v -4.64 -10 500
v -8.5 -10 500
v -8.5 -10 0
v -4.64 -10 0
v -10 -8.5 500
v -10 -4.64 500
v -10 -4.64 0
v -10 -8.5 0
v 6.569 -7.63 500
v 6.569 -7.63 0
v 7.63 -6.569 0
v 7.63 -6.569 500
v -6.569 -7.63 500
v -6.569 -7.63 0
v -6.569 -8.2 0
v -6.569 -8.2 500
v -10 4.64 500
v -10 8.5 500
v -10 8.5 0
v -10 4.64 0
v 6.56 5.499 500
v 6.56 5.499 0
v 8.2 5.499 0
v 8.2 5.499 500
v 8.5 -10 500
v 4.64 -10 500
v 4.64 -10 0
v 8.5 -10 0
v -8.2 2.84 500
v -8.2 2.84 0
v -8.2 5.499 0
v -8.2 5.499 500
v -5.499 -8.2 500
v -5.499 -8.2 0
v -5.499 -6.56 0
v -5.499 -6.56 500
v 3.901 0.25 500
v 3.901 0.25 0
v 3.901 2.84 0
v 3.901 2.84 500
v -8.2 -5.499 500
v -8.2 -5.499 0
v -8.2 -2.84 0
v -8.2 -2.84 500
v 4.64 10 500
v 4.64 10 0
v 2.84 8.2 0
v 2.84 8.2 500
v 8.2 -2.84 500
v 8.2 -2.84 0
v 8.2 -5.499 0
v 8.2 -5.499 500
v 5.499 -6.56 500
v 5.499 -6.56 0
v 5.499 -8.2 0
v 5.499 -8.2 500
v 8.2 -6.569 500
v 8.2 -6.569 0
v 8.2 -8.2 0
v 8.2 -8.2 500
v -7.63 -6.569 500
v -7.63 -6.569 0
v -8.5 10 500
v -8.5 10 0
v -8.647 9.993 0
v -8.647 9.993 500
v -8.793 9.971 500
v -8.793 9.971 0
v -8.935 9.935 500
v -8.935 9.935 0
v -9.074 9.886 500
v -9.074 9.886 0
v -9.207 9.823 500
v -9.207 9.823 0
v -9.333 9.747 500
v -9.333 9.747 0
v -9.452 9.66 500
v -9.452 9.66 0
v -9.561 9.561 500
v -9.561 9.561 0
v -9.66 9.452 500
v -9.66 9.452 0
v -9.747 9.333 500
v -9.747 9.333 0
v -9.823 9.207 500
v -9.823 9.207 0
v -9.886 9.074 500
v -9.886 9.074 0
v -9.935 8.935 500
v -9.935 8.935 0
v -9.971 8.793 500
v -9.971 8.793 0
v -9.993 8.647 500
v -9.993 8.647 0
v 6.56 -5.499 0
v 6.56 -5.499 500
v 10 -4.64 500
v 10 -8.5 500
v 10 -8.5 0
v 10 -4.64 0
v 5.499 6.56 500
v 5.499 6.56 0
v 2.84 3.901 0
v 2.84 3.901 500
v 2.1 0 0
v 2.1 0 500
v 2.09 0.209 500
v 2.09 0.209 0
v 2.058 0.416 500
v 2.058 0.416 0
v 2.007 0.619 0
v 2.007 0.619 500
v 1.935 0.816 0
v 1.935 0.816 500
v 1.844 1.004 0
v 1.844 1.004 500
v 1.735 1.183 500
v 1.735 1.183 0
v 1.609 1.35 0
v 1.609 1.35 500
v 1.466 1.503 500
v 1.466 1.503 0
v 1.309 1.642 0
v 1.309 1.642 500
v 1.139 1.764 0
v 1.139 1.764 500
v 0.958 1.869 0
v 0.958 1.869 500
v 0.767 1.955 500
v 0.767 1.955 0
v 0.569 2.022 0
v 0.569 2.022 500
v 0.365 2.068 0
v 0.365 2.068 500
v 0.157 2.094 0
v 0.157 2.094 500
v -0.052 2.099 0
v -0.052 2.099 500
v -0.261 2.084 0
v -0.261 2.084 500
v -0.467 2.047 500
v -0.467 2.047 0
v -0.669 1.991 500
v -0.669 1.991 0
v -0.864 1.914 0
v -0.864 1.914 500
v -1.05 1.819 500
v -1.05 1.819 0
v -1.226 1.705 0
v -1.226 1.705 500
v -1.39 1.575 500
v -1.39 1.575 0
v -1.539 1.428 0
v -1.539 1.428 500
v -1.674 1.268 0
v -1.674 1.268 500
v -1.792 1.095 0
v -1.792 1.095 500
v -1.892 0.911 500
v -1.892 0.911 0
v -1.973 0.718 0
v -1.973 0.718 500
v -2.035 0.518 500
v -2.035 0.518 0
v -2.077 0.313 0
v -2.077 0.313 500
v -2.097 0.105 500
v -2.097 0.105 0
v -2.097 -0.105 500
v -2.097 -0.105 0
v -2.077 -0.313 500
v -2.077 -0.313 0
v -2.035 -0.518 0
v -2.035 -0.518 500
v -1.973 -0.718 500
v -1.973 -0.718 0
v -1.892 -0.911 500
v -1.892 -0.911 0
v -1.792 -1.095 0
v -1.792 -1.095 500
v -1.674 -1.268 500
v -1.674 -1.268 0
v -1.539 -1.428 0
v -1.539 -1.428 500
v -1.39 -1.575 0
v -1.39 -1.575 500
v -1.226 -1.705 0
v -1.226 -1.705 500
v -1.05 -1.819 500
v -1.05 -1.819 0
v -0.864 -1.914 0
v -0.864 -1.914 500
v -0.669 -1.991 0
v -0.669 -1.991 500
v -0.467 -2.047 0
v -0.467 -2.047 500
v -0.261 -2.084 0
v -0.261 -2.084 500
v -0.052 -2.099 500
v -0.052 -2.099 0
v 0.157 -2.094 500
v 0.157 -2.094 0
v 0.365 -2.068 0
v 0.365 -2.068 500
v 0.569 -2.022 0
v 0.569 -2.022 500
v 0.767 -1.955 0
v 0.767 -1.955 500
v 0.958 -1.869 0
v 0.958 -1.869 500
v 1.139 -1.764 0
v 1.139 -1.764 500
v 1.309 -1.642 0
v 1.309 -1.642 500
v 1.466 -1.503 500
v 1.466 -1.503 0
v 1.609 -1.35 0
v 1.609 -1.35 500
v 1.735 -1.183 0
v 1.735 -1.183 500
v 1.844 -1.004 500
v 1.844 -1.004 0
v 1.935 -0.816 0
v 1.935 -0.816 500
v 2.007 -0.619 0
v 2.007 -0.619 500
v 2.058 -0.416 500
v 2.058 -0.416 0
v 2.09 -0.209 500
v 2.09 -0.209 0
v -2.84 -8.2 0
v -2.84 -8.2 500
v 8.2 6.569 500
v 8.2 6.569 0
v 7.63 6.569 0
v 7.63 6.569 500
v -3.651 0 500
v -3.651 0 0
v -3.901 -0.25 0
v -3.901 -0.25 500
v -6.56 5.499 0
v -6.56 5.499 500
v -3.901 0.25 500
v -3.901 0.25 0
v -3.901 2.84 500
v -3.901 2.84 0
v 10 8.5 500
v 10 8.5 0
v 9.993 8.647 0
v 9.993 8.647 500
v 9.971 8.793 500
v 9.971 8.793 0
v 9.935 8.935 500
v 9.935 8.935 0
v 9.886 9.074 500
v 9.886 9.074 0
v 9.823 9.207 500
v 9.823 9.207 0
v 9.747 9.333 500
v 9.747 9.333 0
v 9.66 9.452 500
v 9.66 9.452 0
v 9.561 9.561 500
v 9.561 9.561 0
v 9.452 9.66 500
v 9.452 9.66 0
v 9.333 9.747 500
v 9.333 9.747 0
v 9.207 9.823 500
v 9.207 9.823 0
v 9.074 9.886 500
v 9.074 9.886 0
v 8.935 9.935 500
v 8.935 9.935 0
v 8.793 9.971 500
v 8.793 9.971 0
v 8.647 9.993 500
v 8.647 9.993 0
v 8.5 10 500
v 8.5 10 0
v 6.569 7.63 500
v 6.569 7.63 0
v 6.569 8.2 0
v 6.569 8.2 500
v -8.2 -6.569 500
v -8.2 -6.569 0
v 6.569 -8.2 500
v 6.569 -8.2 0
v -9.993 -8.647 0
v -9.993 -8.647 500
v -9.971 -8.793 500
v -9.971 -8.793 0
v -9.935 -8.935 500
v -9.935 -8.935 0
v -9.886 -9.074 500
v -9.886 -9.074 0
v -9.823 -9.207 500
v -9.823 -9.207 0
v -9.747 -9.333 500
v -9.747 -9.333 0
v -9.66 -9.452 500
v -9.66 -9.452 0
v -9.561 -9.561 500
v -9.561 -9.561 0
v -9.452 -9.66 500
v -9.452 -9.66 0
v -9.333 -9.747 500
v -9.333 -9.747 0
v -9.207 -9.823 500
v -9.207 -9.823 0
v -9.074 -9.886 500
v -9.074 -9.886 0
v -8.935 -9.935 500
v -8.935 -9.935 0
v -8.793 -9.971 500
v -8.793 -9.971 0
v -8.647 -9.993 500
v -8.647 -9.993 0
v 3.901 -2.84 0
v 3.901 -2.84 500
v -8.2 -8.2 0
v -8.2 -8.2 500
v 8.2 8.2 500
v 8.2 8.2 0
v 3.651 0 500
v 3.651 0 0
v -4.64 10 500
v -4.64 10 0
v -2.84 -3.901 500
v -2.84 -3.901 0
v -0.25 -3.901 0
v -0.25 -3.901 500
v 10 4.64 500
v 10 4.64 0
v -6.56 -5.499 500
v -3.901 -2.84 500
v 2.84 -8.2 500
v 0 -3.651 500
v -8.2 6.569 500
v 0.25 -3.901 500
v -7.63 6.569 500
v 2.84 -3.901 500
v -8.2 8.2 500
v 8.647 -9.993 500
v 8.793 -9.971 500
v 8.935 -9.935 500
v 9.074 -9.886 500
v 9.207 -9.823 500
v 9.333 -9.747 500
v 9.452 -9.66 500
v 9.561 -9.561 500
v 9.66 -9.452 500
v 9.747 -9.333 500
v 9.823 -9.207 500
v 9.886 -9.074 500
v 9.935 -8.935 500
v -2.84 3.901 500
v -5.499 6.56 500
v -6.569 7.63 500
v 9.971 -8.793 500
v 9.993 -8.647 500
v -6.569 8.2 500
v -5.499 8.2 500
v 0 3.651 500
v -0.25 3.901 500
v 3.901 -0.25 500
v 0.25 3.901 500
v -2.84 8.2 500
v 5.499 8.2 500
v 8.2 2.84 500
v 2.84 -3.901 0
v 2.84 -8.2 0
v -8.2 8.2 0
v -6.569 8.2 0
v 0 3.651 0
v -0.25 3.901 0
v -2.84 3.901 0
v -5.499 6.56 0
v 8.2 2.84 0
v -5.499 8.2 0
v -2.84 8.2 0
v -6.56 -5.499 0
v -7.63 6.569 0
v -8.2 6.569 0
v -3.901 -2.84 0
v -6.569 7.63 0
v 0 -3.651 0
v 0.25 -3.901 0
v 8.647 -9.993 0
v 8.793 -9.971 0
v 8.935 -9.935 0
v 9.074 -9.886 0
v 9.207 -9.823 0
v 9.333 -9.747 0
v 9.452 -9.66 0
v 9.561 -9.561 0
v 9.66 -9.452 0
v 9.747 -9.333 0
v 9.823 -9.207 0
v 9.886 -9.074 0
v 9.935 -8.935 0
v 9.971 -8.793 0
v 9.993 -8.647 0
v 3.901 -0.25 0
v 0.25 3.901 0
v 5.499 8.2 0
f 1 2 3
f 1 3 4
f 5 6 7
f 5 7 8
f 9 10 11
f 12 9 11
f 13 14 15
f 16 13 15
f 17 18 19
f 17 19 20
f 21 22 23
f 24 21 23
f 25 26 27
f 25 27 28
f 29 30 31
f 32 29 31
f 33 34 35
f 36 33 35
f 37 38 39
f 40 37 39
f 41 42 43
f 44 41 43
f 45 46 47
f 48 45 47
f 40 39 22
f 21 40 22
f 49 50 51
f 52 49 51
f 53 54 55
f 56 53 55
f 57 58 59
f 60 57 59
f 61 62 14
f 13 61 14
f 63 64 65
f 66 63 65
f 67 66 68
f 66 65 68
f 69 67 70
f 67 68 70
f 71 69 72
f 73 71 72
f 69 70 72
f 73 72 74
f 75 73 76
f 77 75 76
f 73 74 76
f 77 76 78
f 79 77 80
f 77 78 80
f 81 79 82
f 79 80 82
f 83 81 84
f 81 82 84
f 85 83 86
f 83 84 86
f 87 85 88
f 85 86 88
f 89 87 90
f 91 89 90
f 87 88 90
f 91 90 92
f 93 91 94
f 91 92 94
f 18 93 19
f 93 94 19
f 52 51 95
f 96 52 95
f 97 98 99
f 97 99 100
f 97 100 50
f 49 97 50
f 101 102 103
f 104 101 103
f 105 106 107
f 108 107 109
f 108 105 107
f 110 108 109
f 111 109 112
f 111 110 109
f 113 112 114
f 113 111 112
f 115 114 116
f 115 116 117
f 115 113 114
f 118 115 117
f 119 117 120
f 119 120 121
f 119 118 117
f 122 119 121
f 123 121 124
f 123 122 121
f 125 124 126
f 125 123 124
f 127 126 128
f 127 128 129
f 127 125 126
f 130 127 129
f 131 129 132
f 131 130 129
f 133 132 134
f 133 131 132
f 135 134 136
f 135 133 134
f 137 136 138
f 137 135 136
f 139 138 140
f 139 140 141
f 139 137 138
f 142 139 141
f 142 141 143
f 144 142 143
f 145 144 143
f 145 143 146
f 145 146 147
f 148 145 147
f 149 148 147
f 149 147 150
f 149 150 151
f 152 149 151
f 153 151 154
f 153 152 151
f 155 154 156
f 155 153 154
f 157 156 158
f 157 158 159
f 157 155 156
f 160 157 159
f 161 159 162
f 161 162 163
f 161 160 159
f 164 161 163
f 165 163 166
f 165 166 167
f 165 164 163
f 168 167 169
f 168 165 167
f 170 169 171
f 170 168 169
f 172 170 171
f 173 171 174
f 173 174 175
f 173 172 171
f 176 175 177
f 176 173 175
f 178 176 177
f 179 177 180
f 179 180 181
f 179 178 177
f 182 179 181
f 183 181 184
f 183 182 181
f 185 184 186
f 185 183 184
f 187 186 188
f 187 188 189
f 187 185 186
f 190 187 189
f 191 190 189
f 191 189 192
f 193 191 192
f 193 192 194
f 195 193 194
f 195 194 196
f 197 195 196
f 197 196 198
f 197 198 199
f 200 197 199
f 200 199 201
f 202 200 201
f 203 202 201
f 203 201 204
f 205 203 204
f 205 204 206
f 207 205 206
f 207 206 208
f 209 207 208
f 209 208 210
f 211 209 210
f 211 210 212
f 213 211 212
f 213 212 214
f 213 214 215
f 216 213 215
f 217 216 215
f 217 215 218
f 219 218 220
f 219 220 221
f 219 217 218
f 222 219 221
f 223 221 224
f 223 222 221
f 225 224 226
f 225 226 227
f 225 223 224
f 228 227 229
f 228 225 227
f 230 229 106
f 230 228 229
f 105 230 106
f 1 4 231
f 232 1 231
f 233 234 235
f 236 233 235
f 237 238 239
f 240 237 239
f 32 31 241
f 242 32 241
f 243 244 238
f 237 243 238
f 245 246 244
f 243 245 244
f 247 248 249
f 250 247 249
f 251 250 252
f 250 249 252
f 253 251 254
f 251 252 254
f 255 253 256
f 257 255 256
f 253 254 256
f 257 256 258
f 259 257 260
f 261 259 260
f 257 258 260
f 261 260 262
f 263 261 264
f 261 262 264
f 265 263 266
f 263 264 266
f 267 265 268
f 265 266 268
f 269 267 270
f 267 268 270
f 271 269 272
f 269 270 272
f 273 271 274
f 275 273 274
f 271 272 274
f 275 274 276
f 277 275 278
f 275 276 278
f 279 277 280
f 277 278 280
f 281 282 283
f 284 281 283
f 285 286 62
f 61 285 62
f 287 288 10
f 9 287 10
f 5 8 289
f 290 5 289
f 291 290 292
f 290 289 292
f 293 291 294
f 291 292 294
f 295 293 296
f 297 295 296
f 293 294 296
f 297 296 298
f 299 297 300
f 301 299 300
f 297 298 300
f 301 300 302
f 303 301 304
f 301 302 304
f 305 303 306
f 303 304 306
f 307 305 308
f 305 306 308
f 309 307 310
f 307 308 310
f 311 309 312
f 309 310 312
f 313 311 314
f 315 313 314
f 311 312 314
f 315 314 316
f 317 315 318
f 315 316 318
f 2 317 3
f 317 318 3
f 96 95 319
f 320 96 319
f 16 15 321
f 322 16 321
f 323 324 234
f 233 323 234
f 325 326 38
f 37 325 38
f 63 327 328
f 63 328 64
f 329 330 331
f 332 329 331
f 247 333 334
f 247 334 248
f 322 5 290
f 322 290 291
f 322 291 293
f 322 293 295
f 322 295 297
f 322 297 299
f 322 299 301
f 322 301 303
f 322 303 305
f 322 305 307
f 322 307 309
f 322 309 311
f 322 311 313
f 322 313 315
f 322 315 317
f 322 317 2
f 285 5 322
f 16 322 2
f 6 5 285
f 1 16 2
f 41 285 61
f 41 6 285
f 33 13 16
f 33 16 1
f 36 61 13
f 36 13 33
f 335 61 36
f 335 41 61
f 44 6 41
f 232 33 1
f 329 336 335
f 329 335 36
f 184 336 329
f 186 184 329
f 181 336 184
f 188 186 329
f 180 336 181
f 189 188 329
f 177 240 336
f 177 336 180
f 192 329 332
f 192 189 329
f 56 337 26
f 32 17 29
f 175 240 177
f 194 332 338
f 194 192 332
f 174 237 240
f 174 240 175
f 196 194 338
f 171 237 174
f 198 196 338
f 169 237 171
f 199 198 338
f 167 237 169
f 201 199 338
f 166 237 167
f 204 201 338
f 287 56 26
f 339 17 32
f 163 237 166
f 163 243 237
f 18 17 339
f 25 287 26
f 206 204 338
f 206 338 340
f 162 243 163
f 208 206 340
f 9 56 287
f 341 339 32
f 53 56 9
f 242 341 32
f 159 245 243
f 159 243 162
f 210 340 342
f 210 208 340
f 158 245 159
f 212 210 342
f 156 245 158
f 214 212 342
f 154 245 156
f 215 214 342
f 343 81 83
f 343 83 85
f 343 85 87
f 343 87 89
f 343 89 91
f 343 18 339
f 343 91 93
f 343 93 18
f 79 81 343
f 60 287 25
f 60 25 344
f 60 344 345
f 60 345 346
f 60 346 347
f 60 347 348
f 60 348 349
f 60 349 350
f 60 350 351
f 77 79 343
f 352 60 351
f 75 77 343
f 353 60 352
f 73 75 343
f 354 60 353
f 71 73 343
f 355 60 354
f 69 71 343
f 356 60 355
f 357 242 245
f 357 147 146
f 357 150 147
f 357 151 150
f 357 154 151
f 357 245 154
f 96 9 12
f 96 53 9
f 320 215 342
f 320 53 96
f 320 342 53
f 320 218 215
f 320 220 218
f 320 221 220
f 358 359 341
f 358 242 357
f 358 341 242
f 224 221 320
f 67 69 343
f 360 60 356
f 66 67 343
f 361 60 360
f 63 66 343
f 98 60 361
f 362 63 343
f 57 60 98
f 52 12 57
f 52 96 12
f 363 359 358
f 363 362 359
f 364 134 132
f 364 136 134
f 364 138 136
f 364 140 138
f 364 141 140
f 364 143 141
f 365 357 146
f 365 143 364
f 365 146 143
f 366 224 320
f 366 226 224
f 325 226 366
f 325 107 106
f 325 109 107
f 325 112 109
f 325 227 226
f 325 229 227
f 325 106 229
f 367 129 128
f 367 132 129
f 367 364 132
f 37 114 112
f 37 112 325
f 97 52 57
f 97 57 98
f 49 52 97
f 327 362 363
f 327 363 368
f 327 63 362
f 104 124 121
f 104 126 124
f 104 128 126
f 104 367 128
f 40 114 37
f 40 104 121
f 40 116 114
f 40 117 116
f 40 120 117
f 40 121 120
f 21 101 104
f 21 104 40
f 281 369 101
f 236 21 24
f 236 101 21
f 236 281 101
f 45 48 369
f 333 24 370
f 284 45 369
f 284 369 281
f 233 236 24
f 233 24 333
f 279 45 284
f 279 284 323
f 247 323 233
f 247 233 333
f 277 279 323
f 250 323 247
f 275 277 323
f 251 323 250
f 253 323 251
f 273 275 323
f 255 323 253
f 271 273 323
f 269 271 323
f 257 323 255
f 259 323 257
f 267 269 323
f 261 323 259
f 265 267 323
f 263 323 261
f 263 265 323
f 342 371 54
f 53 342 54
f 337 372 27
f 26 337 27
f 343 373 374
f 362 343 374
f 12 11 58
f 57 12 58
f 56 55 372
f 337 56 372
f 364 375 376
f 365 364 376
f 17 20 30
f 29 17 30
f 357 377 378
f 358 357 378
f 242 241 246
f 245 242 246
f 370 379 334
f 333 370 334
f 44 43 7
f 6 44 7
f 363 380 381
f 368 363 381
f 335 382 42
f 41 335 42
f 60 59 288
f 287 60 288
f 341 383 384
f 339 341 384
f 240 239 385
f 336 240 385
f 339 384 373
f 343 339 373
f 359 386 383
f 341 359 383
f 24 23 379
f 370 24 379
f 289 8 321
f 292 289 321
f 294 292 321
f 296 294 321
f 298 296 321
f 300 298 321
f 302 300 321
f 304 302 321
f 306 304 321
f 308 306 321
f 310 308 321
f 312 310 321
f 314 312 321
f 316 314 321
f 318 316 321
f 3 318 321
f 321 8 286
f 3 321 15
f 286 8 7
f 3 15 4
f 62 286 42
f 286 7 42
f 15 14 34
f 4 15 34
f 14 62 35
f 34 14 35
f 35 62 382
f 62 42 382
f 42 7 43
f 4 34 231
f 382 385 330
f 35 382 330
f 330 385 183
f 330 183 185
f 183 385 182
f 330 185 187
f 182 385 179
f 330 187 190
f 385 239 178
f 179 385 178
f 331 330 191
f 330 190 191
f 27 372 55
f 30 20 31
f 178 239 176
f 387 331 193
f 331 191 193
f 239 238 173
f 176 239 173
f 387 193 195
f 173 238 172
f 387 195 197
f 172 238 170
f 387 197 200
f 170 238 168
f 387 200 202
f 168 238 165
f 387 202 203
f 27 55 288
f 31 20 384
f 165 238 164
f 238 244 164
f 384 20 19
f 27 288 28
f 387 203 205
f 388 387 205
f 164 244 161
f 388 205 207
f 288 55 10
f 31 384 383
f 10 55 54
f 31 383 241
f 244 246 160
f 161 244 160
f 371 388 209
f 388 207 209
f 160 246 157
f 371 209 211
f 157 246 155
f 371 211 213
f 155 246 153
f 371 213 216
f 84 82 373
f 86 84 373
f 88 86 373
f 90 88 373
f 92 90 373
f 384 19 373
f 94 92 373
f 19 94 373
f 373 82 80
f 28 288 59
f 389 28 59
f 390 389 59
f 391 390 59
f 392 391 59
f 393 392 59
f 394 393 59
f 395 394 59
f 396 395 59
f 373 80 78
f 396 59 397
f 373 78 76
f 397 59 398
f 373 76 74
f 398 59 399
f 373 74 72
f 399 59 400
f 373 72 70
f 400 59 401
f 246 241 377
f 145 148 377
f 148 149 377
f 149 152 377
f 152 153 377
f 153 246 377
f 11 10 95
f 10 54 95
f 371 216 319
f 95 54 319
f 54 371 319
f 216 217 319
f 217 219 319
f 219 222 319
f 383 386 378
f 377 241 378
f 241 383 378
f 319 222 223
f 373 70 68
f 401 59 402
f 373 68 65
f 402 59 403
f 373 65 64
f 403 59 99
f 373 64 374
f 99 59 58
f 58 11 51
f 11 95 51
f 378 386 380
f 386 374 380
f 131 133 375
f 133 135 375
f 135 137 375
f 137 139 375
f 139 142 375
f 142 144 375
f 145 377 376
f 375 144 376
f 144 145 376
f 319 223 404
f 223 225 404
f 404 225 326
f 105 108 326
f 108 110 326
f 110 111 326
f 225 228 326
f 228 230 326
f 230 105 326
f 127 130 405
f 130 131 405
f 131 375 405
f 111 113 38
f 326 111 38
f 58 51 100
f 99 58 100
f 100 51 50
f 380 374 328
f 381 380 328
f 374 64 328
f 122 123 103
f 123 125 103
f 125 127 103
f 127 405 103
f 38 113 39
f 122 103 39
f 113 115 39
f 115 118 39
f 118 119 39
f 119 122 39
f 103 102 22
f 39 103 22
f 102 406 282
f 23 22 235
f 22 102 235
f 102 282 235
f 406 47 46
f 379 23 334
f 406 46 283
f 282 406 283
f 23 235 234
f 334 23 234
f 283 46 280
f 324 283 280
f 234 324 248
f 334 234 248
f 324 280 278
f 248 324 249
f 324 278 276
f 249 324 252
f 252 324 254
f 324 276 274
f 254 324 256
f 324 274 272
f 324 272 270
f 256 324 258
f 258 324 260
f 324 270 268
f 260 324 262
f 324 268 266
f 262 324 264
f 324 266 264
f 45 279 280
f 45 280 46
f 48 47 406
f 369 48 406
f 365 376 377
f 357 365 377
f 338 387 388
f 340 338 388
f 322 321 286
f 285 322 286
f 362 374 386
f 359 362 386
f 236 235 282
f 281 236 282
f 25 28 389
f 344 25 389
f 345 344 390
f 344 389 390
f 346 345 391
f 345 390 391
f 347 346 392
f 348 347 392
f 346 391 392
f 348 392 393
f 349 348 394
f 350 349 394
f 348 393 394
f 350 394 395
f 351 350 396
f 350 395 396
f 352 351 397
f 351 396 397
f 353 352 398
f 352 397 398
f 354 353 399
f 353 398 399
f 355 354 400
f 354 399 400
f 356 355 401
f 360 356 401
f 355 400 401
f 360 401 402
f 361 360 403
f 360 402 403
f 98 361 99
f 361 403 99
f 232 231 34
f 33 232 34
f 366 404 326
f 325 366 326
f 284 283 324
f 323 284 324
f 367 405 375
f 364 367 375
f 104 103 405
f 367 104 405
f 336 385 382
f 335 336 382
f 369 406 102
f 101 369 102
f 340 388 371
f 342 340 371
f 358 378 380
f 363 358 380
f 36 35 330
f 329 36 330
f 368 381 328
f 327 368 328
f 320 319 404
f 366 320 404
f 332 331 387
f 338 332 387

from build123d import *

# Parameters (mm, degrees)
F0_R     = 2.1
F1_DEPTH = 500


with BuildPart() as f1:
    # F0 (on Top) → F1 (new body)
    with BuildSketch(Plane.XY):
        with BuildLine():
            Line((10, 4.64), (10, 8.5))
            ThreePointArc((10, 8.5), (9.56066, 9.56066), (8.5, 10))
            Line((8.5, 10), (4.64, 10))
            Line((4.64, 10), (2.84, 8.2))
            Line((2.84, 8.2), (5.49934, 8.2))
            Line((5.49934, 8.2), (5.49934, 6.56))
            Line((5.49934, 6.56), (2.84, 3.90066))
            Line((2.84, 3.90066), (0.25, 3.90066))
            Line((0.25, 3.90066), (0, 3.65066))
            Line((0, 3.65066), (-0.25, 3.90066))
            Line((-0.25, 3.90066), (-2.84, 3.90066))
            Line((-2.84, 3.90066), (-5.49934, 6.56))
            Line((-5.49934, 6.56), (-5.49934, 8.2))
            Line((-5.49934, 8.2), (-2.84, 8.2))
            Line((-2.84, 8.2), (-4.64, 10))
            Line((-4.64, 10), (-8.5, 10))
            ThreePointArc((-8.5, 10), (-9.56066, 9.56066), (-10, 8.5))
            Line((-10, 8.5), (-10, 4.64))
            Line((-10, 4.64), (-8.2, 2.84))
            Line((-8.2, 2.84), (-8.2, 5.49934))
            Line((-8.2, 5.49934), (-6.56, 5.49934))
            Line((-6.56, 5.49934), (-3.90066, 2.84))
            Line((-3.90066, 2.84), (-3.90066, 0.25))
            Line((-3.90066, 0.25), (-3.65066, 0))
            Line((-3.65066, 0), (-3.90066, -0.25))
            Line((-3.90066, -0.25), (-3.90066, -2.84))
            Line((-3.90066, -2.84), (-6.56, -5.49934))
            Line((-6.56, -5.49934), (-8.2, -5.49934))
            Line((-8.2, -5.49934), (-8.2, -2.84))
            Line((-8.2, -2.84), (-10, -4.64))
            Line((-10, -4.64), (-10, -8.5))
            ThreePointArc((-10, -8.5), (-9.56066, -9.56066), (-8.5, -10))
            Line((-8.5, -10), (-4.64, -10))
            Line((-4.64, -10), (-2.84, -8.2))
            Line((-2.84, -8.2), (-5.49934, -8.2))
            Line((-5.49934, -8.2), (-5.49934, -6.56))
            Line((-5.49934, -6.56), (-2.84, -3.90066))
            Line((-2.84, -3.90066), (-0.25, -3.90066))
            Line((-0.25, -3.90066), (0, -3.65066))
            Line((0, -3.65066), (0.25, -3.90066))
            Line((0.25, -3.90066), (2.84, -3.90066))
            Line((2.84, -3.90066), (5.49934, -6.56))
            Line((5.49934, -6.56), (5.49934, -8.2))
            Line((5.49934, -8.2), (2.84, -8.2))
            Line((2.84, -8.2), (4.64, -10))
            Line((4.64, -10), (8.5, -10))
            ThreePointArc((8.5, -10), (9.56066, -9.56066), (10, -8.5))
            Line((10, -8.5), (10, -4.64))
            Line((10, -4.64), (8.2, -2.84))
            Line((8.2, -2.84), (8.2, -5.49934))
            Line((8.2, -5.49934), (6.56, -5.49934))
            Line((6.56, -5.49934), (3.90066, -2.84))
            Line((3.90066, -2.84), (3.90066, -0.25))
            Line((3.90066, -0.25), (3.65066, 0))
            Line((3.65066, 0), (3.90066, 0.25))
            Line((3.90066, 0.25), (3.90066, 2.84))
            Line((3.90066, 2.84), (6.56, 5.49934))
            Line((6.56, 5.49934), (8.2, 5.49934))
            Line((8.2, 5.49934), (8.2, 2.84))
            Line((8.2, 2.84), (10, 4.64))
        make_face()
        Polygon((-6.56934, -7.63), (-6.56934, -8.2), (-8.2, -8.2), (-8.2, -6.56934), (-7.63, -6.56934), align=None, mode=Mode.SUBTRACT)
        Polygon((8.2, -8.2), (6.56934, -8.2), (6.56934, -7.63), (7.63, -6.56934), (8.2, -6.56934), align=None, mode=Mode.SUBTRACT)
        Polygon((-7.63, 6.56934), (-8.2, 6.56934), (-8.2, 8.2), (-6.56934, 8.2), (-6.56934, 7.63), align=None, mode=Mode.SUBTRACT)
        Circle(F0_R, mode=Mode.SUBTRACT)
        Polygon((6.56934, 7.63), (6.56934, 8.2), (8.2, 8.2), (8.2, 6.56934), (7.63, 6.56934), align=None, mode=Mode.SUBTRACT)
    extrude(amount=F1_DEPTH)


solid = f1.part
